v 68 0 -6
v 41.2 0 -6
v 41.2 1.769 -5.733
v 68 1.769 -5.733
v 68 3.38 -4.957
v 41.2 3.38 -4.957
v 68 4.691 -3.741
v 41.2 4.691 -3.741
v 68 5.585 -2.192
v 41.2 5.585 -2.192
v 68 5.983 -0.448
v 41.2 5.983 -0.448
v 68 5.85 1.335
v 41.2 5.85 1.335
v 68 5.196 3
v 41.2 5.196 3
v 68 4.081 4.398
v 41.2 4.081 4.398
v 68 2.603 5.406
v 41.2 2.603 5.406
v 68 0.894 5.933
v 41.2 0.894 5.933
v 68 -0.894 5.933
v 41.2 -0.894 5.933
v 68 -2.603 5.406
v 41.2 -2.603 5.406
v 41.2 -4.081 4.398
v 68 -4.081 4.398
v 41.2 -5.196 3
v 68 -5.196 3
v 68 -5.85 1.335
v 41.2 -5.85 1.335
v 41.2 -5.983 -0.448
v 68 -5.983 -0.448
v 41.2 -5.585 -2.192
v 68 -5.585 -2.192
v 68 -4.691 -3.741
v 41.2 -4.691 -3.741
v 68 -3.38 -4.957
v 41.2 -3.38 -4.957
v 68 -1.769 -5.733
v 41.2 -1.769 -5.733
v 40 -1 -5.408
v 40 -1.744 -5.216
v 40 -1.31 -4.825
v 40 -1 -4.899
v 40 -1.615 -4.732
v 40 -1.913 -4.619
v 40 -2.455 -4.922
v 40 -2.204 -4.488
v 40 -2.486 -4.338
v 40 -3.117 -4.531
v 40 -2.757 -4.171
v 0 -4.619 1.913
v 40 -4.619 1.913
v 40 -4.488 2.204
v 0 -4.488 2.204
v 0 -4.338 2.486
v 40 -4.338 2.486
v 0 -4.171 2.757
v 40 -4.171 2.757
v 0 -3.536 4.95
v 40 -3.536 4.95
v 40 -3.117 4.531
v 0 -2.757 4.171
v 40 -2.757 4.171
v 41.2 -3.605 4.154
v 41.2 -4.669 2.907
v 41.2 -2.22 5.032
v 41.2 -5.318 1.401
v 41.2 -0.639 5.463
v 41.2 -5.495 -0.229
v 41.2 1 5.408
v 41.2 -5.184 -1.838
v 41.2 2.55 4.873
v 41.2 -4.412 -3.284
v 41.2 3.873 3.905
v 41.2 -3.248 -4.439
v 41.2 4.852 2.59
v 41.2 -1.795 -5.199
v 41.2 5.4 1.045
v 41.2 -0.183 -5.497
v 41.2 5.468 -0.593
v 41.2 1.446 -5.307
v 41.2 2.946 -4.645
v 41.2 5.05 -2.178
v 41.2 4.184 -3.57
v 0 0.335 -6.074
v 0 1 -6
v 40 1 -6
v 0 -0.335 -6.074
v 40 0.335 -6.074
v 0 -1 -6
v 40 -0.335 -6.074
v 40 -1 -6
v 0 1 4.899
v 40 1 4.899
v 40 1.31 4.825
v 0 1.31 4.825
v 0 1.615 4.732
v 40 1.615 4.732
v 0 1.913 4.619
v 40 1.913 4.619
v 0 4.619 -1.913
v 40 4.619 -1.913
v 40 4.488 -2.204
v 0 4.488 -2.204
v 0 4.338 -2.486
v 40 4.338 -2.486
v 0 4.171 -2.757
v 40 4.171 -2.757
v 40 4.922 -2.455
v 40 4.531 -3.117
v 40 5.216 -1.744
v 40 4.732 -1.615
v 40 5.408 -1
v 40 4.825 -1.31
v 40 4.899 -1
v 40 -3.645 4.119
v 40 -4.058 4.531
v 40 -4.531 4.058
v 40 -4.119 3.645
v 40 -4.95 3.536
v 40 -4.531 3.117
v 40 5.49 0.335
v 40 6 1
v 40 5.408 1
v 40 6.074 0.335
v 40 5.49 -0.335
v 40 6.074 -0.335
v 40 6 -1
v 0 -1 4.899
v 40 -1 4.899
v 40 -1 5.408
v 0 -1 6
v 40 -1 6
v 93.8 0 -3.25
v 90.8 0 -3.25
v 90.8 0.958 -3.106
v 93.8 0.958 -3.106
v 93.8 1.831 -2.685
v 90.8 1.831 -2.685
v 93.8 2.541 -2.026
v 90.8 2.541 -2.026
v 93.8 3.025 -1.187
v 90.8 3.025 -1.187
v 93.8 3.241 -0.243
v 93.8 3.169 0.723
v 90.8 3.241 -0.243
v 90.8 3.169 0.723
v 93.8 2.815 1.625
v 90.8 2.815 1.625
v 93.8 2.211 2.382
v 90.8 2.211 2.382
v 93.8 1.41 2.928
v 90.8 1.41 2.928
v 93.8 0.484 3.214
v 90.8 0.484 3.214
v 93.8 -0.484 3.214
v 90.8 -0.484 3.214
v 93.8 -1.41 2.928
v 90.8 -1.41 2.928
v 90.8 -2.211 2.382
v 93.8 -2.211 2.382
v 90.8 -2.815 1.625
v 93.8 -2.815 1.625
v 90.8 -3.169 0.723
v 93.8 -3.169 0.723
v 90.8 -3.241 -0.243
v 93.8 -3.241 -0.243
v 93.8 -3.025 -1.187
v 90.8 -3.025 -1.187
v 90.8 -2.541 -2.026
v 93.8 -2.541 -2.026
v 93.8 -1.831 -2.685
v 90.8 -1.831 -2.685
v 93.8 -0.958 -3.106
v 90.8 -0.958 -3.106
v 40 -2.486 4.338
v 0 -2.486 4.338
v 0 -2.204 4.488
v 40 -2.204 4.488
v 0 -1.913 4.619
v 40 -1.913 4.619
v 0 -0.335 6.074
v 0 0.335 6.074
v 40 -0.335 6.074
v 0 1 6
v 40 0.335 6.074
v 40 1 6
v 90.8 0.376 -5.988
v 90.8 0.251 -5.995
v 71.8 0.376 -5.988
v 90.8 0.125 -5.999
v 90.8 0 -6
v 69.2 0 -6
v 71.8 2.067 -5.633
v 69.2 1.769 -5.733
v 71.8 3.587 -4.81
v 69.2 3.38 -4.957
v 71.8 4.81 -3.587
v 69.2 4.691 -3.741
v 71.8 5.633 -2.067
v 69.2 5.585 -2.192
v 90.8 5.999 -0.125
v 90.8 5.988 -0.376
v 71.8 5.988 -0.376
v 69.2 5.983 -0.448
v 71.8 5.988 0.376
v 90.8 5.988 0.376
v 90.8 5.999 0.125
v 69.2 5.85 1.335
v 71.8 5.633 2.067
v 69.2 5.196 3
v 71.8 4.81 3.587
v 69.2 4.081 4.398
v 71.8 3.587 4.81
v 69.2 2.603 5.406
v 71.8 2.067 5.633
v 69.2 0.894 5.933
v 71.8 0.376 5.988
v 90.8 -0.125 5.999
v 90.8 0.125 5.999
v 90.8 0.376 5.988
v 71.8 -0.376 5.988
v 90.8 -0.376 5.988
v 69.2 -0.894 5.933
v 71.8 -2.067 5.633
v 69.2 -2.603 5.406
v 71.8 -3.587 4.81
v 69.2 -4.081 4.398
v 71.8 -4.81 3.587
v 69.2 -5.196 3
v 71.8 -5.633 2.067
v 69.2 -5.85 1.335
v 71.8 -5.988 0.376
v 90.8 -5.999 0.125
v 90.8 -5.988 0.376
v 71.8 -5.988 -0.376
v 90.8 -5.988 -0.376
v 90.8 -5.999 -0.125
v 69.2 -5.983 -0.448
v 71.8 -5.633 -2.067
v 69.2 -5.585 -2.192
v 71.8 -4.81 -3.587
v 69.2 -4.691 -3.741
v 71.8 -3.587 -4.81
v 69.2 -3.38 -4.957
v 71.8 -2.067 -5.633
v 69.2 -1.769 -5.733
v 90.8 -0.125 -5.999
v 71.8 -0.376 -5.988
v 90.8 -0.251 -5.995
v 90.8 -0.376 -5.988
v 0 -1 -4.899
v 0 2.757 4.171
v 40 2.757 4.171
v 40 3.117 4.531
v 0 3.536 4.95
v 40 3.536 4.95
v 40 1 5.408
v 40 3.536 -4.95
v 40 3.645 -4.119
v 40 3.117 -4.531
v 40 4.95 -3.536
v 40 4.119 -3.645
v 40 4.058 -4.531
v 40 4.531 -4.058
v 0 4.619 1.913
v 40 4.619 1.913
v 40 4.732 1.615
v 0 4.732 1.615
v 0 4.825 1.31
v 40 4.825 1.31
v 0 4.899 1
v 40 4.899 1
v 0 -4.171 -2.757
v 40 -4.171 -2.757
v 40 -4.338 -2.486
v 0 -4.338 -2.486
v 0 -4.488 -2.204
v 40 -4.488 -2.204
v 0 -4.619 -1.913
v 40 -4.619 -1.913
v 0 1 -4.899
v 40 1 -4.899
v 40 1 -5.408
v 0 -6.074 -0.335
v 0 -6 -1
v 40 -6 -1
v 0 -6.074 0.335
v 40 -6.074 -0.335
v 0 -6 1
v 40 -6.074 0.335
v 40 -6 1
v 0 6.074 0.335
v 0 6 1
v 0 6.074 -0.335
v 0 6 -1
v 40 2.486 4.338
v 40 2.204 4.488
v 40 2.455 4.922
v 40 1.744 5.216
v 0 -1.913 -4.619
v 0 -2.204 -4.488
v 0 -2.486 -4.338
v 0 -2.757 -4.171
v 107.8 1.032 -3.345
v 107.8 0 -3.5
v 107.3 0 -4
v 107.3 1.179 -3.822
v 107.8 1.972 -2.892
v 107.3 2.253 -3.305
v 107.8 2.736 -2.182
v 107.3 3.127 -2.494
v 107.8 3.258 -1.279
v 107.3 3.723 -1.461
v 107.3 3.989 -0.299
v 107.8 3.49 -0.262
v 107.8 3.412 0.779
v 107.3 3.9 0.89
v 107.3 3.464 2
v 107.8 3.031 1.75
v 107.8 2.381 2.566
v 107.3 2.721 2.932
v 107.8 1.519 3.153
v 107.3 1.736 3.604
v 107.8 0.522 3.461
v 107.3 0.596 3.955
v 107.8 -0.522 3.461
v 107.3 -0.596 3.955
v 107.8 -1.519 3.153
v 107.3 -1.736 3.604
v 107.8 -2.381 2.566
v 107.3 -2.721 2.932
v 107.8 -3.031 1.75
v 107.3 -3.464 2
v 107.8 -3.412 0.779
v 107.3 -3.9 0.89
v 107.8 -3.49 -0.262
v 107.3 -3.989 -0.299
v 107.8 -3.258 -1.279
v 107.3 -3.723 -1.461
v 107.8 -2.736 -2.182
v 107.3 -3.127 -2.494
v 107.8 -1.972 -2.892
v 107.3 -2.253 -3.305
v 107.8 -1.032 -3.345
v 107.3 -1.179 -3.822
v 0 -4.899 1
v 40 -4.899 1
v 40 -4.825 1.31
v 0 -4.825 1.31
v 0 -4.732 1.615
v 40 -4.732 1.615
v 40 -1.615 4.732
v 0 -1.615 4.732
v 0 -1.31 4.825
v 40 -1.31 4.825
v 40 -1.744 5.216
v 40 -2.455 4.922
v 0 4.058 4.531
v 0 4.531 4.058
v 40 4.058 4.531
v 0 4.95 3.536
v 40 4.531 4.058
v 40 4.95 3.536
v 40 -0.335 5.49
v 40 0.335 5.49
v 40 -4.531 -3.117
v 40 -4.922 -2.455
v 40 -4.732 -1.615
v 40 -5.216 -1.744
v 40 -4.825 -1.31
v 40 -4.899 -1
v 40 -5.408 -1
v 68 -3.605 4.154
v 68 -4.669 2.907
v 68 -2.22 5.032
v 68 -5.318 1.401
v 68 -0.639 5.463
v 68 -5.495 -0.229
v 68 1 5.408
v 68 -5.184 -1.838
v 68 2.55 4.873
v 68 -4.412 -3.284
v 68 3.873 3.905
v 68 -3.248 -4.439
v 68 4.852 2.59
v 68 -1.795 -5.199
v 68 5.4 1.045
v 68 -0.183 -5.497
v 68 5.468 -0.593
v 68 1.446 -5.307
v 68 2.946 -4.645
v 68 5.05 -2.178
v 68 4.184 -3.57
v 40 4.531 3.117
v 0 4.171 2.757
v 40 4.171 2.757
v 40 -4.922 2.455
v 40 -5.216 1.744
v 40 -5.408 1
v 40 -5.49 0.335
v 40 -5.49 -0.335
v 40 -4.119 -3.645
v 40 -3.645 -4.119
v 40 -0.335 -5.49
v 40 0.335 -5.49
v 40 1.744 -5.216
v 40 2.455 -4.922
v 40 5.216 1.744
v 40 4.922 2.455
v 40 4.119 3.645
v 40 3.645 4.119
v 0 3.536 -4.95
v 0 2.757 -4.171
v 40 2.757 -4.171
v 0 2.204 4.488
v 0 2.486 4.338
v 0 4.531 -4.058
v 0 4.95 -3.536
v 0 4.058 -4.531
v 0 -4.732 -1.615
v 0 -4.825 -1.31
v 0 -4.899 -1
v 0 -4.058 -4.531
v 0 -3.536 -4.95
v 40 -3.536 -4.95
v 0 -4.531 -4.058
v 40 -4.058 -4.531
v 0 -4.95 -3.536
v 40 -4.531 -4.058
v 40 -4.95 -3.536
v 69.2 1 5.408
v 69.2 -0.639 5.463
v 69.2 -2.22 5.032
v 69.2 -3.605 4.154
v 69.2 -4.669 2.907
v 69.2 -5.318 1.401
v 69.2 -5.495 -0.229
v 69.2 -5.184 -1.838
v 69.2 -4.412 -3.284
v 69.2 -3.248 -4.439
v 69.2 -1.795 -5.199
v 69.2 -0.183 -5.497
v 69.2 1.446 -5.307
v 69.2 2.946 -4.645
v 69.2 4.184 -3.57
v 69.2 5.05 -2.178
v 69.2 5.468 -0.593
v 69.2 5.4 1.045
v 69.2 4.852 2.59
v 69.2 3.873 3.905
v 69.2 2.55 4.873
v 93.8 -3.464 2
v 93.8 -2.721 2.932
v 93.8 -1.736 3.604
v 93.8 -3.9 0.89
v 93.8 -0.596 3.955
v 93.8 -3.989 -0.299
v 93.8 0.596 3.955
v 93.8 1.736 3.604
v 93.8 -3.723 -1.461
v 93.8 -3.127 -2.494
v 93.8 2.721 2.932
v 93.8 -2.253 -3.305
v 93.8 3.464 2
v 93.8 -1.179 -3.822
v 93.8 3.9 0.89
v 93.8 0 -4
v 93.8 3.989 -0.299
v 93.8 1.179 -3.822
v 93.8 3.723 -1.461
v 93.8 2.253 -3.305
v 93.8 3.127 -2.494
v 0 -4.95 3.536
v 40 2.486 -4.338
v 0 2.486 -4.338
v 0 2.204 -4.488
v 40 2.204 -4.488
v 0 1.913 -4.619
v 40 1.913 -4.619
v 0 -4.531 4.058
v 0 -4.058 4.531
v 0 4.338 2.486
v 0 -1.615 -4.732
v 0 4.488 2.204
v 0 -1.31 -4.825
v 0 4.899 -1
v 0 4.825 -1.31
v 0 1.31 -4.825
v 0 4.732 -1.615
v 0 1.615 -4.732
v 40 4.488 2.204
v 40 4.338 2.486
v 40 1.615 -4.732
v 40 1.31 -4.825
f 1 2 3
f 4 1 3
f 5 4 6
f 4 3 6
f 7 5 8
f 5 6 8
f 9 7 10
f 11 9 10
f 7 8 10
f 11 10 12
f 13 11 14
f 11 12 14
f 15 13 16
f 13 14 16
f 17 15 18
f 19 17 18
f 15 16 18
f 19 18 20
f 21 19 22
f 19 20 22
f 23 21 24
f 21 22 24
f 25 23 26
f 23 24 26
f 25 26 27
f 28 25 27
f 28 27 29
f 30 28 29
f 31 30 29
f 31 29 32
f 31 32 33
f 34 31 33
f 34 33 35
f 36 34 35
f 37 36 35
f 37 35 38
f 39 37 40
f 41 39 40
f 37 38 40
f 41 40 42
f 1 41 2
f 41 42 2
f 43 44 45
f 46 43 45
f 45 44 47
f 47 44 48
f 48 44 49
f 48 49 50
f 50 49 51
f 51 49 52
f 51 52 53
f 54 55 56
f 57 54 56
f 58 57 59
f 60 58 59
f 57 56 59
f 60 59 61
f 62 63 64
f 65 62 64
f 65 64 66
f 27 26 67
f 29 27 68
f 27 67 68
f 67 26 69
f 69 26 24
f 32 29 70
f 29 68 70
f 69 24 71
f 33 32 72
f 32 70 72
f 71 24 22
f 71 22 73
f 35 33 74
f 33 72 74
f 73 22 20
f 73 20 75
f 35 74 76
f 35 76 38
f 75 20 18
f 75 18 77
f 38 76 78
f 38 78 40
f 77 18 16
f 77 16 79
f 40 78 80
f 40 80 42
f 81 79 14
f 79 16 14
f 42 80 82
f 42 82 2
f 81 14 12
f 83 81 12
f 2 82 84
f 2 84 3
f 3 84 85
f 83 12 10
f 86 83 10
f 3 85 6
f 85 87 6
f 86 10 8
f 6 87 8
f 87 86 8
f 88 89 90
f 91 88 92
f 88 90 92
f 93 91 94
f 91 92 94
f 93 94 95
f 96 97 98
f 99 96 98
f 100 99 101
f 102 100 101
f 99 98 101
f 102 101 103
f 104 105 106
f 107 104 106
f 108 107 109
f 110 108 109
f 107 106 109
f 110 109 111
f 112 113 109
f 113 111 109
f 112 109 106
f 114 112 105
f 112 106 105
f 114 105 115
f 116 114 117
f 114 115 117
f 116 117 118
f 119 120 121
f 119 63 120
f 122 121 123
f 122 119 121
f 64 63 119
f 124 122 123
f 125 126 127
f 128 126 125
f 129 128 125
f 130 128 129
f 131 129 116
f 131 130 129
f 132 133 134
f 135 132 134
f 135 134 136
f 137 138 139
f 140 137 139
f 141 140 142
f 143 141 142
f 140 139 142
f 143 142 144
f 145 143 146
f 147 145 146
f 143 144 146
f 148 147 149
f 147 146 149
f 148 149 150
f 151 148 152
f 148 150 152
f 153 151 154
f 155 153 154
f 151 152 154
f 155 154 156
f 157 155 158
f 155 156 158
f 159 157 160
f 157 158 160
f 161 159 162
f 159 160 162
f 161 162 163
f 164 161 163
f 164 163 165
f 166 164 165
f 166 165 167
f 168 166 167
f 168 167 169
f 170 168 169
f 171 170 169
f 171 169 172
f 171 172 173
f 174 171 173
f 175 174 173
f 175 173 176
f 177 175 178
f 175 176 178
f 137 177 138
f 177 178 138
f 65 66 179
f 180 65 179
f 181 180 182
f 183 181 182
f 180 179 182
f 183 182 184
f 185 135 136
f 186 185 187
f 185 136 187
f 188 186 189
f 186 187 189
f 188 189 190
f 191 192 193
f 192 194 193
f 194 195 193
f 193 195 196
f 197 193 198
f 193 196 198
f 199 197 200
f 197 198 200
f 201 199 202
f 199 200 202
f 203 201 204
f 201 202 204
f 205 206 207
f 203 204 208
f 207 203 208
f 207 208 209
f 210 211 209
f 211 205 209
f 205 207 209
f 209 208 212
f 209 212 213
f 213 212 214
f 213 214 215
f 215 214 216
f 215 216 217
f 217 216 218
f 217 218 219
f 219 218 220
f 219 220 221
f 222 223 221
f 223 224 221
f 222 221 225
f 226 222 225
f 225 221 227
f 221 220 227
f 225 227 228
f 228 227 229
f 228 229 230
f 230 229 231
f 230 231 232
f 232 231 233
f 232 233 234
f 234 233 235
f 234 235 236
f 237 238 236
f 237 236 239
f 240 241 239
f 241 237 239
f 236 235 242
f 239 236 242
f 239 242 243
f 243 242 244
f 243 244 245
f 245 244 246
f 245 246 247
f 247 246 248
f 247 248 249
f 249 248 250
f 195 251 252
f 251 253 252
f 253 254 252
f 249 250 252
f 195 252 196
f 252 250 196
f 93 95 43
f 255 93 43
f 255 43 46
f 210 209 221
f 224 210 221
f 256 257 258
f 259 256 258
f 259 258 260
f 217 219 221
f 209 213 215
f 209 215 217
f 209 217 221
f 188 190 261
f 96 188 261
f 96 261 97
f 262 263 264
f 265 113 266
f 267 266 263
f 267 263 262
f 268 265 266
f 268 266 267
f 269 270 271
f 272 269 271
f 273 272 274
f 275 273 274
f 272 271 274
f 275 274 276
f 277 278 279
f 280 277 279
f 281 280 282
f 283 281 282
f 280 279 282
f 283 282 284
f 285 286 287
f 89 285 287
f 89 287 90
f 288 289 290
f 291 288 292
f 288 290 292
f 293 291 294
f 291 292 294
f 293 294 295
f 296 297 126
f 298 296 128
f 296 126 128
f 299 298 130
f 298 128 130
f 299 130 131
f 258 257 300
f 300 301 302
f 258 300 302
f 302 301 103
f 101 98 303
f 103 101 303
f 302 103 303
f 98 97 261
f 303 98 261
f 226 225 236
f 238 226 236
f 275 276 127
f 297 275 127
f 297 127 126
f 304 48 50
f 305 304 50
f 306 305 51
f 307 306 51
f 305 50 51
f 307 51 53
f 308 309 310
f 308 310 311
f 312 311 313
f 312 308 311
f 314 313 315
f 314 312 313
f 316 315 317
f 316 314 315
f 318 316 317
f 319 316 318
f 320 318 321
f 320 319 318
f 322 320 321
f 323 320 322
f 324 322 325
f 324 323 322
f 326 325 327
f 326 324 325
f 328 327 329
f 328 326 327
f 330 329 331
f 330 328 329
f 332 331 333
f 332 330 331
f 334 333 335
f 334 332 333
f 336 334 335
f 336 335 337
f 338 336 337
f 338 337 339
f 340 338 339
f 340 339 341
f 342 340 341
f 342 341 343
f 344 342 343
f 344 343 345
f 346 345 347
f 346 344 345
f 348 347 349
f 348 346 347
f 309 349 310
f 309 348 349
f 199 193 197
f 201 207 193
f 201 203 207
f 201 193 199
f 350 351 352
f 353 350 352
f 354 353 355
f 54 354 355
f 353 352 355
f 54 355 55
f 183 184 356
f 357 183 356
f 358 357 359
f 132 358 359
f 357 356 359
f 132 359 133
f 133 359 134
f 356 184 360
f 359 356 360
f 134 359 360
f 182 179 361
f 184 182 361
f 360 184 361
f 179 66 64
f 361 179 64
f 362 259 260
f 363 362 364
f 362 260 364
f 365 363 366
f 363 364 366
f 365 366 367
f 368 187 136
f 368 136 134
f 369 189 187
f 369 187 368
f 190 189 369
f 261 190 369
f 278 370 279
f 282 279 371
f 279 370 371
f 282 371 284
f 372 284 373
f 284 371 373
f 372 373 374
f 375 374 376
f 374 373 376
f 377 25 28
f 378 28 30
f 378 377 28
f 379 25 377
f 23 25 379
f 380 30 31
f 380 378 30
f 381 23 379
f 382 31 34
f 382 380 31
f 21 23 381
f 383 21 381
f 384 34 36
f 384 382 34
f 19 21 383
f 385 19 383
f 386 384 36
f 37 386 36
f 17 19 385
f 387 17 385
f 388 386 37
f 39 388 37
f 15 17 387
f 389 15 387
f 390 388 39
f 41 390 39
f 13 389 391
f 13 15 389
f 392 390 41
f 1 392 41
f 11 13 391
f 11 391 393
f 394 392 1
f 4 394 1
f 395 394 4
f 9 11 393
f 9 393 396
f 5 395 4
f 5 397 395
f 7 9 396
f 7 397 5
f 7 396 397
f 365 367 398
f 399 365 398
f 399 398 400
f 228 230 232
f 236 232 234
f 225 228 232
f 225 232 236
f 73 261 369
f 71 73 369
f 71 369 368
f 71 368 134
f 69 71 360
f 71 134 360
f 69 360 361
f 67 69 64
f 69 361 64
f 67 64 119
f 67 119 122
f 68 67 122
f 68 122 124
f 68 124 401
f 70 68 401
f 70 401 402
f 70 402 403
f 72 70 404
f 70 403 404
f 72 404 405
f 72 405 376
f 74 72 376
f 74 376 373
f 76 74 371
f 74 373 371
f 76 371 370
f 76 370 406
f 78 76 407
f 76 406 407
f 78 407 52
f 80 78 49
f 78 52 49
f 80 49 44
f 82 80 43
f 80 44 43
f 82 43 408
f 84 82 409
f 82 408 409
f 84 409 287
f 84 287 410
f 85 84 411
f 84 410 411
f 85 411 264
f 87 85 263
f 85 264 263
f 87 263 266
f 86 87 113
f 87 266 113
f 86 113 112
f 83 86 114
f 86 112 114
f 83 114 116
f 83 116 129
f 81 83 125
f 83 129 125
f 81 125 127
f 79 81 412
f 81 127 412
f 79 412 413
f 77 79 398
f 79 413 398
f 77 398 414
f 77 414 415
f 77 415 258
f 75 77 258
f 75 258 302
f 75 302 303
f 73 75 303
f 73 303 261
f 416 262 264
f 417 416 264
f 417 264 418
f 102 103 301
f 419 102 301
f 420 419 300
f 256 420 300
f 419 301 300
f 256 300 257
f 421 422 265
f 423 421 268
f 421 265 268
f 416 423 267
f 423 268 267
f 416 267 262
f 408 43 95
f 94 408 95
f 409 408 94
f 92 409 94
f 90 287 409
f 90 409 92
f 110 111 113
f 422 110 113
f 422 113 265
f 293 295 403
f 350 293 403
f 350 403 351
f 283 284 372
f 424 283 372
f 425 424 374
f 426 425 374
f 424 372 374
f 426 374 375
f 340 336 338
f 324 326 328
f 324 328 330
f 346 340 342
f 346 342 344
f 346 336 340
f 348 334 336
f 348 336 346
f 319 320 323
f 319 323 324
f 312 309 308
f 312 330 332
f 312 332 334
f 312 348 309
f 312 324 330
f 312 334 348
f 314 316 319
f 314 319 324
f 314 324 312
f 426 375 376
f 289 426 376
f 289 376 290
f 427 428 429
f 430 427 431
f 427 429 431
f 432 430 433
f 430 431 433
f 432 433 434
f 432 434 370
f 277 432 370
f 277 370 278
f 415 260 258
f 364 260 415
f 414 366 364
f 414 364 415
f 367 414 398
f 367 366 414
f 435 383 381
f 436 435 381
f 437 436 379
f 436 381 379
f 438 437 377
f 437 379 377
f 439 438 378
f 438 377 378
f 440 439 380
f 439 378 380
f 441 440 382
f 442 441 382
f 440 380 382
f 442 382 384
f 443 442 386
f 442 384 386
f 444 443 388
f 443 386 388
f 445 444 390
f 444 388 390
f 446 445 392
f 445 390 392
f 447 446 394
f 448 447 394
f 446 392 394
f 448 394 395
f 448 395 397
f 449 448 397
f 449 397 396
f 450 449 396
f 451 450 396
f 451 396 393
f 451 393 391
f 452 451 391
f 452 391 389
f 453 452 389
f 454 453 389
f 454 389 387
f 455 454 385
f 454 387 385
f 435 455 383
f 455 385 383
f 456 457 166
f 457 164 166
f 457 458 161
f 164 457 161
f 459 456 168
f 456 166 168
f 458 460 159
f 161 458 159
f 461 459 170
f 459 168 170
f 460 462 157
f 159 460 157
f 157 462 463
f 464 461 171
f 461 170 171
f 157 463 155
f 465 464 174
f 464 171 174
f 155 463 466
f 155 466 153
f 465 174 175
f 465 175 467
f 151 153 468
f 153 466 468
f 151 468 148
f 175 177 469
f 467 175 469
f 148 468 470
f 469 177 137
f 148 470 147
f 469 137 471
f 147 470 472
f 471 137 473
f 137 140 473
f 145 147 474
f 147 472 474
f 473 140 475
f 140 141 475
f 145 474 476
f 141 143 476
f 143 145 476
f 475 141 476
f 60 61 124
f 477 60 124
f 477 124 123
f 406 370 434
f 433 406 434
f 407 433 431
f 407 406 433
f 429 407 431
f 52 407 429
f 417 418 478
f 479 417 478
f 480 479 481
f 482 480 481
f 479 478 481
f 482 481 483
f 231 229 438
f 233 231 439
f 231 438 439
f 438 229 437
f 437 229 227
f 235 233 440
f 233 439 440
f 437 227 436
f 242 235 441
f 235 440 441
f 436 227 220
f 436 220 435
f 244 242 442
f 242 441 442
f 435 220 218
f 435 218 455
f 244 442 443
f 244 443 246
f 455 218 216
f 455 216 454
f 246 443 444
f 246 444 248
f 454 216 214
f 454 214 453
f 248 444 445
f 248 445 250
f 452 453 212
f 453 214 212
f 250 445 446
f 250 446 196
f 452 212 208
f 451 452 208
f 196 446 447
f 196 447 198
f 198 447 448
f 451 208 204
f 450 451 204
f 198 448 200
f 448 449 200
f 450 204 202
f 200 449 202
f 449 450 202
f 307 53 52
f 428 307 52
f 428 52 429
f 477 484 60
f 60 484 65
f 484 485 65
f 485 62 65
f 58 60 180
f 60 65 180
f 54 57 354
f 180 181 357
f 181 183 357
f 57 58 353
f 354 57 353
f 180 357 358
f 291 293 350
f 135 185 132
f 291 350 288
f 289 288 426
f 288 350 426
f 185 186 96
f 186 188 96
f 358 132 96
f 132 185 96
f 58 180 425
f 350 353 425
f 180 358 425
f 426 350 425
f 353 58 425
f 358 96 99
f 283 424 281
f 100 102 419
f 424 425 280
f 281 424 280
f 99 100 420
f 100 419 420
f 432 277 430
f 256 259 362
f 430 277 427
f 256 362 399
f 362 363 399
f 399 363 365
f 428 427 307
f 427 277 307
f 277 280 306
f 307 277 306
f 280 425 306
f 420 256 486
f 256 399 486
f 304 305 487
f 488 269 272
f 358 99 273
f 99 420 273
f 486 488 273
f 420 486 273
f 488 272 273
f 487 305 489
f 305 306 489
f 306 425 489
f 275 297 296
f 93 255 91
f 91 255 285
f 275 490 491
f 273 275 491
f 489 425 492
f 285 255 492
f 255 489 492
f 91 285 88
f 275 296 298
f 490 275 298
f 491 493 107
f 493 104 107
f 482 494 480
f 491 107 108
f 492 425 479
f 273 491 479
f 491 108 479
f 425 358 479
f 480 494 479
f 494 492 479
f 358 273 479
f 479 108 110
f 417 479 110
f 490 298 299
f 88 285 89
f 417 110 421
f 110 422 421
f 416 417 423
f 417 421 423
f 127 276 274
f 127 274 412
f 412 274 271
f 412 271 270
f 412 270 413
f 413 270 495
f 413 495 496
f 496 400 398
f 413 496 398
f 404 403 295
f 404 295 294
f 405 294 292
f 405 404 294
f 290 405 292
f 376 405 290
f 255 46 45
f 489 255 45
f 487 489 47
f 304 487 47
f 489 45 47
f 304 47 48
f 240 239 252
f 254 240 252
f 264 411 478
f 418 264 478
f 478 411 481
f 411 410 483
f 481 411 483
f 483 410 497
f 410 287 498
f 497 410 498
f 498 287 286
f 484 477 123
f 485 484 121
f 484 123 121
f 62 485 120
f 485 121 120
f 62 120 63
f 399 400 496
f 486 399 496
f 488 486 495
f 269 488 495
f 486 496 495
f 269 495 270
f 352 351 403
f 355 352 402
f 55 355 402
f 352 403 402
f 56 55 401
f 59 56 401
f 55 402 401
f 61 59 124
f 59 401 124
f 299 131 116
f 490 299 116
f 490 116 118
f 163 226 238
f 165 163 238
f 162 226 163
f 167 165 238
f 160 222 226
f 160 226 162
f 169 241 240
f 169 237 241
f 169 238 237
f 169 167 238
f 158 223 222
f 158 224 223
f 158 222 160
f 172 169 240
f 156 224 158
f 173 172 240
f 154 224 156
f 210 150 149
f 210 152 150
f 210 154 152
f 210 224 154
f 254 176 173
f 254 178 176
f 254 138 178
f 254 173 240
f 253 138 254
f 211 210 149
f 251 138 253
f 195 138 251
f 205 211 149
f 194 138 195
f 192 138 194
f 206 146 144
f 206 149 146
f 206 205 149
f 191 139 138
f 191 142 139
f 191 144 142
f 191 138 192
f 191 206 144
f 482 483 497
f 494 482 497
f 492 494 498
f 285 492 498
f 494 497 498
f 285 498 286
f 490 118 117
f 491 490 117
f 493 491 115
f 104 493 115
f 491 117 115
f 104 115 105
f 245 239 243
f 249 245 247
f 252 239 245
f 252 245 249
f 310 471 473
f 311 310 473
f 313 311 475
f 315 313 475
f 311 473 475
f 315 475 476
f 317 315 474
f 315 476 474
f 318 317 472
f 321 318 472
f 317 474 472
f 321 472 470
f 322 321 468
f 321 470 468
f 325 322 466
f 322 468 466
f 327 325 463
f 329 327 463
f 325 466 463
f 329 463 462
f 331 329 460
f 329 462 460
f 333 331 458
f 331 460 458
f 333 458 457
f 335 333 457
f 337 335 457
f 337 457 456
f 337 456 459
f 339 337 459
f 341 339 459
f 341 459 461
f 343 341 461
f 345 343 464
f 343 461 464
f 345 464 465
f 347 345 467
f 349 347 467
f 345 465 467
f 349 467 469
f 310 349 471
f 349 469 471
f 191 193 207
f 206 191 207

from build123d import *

# Parameters (mm, degrees)
SKETCH_1_R               = 7
EXTRUDE_1_DEPTH          = 40
CUT_EXTRUDE_1_DEPTH      = 40
PATTERN_CIRCULAR_1_COUNT = 8
SKETCH_3_R               = 5.5
EXTRUDE_2_DEPTH          = 1.2
SKETCH_4_R               = 6
EXTRUDE_3_DEPTH          = 26.8
SKETCH_5_R               = 5.5
EXTRUDE_4_DEPTH          = 1.2
SKETCH_6_R               = 6
EXTRUDE_5_DEPTH          = 2.6
EXTRUDE_6_DEPTH          = 19
SKETCH_8_R               = 3.25
EXTRUDE_7_DEPTH          = 3
SKETCH_9_R               = 4
EXTRUDE_8_DEPTH          = 14
CHAMFER_1_SIZE           = 0.5
SKETCH_10_OUTSIDE_W      = 36.586
SKETCH_10_OUTSIDE_H      = 36.586
SKETCH_10_OUTSIDE_R      = 6
CUT_EXTRUDE_2_DEPTH      = 22


with BuildPart() as part:
    # 草图1 → 凸台-拉伸1 (new body)
    with BuildSketch(Plane(origin=(0, 0, 0), x_dir=(0, 0, -1), z_dir=(1, 0, 0))):
        Circle(SKETCH_1_R)
    extrude(amount=EXTRUDE_1_DEPTH)

    # 草图2 → 切除-拉伸1 (cut)
    with BuildSketch(Plane(origin=(40, 0, 0), x_dir=(0, 0, -1), z_dir=(1, 0, 0))):
        with BuildLine():
            Line((1, 6), (1, 4.898979486))
            ThreePointArc((1, 4.898979486), (1.463400625, 4.78105204), (1.913417162, 4.619397663))
            Line((1.913417162, 4.619397663), (3.826834324, 9.238795325))
            ThreePointArc((3.826834324, 9.238795325), (0, 10), (-3.826834324, 9.238795325))
            Line((-3.826834324, 9.238795325), (-1.913417162, 4.619397663))
            ThreePointArc((-1.913417162, 4.619397663), (-1.463400625, 4.78105204), (-1, 4.898979486))
            Line((-1, 4.898979486), (-1, 6))
            ThreePointArc((-1, 6), (0, 6.08276253), (1, 6))
        make_face()
    cut_extrude_1 = extrude(amount=-CUT_EXTRUDE_1_DEPTH, mode=Mode.SUBTRACT)

    # 阵列(圆周)1: 切除-拉伸1 ×8 about axis
    pattern_circular_1_axis = Axis((88.99, 0, 0), (-1, 0, 0))
    for i in range(1, PATTERN_CIRCULAR_1_COUNT):
        add(cut_extrude_1.rotate(pattern_circular_1_axis, i * 360 / PATTERN_CIRCULAR_1_COUNT), mode=Mode.SUBTRACT)

    # 草图3 → 凸台-拉伸2 (add)
    with BuildSketch(Plane(origin=(40, 0, 0), x_dir=(0, 0, -1), z_dir=(1, 0, 0))):
        Circle(SKETCH_3_R)
    extrude(amount=EXTRUDE_2_DEPTH)

    # 草图4 → 凸台-拉伸3 (add)
    with BuildSketch(Plane(origin=(41.2, 0, 0), x_dir=(0, 0, -1), z_dir=(1, 0, 0))):
        Circle(SKETCH_4_R)
    extrude(amount=EXTRUDE_3_DEPTH)

    # 草图5 → 凸台-拉伸4 (add)
    with BuildSketch(Plane(origin=(68, 0, 0), x_dir=(0, 0, -1), z_dir=(1, 0, 0))):
        Circle(SKETCH_5_R)
    extrude(amount=EXTRUDE_4_DEPTH)

    # 草图6 → 凸台-拉伸5 (add)
    with BuildSketch(Plane(origin=(69.2, 0, 0), x_dir=(0, 0, -1), z_dir=(1, 0, 0))):
        Circle(SKETCH_6_R)
    extrude(amount=EXTRUDE_5_DEPTH)

    # 草图7 → 凸台-拉伸6 (add)
    with BuildSketch(Plane(origin=(71.8, 0, 0), x_dir=(0, 0, -1), z_dir=(1, 0, 0))):
        Polygon((0, -6.363961031), (6.363961031, 0), (0, 6.363961031), (-6.363961031, 0), align=None)
    extrude(amount=EXTRUDE_6_DEPTH)

    # 草图8 → 凸台-拉伸7 (add)
    with BuildSketch(Plane(origin=(90.8, 0, 0), x_dir=(0, 0, -1), z_dir=(1, 0, 0))):
        Circle(SKETCH_8_R)
    extrude(amount=EXTRUDE_7_DEPTH)

    # 草图9 → 凸台-拉伸8 (add)
    with BuildSketch(Plane(origin=(93.8, 0, 0), x_dir=(0, 0, -1), z_dir=(1, 0, 0))):
        Circle(SKETCH_9_R)
    extrude(amount=EXTRUDE_8_DEPTH)

    # 倒角1
    chamfer_1_edges = [part.edges().sort_by_distance(p)[0] for p in [
        (107.8, 0, 4),
    ]]
    chamfer(chamfer_1_edges, length=CHAMFER_1_SIZE)

    # 草图10 outside → 切除-拉伸2 (cut)
    with BuildSketch(Plane(origin=(71.8, 0, 0), x_dir=(0, 0, -1), z_dir=(1, 0, 0))):
        Rectangle(SKETCH_10_OUTSIDE_W, SKETCH_10_OUTSIDE_H)
        Circle(SKETCH_10_OUTSIDE_R, mode=Mode.SUBTRACT)
    extrude(amount=CUT_EXTRUDE_2_DEPTH, mode=Mode.SUBTRACT)


solid = part.part
